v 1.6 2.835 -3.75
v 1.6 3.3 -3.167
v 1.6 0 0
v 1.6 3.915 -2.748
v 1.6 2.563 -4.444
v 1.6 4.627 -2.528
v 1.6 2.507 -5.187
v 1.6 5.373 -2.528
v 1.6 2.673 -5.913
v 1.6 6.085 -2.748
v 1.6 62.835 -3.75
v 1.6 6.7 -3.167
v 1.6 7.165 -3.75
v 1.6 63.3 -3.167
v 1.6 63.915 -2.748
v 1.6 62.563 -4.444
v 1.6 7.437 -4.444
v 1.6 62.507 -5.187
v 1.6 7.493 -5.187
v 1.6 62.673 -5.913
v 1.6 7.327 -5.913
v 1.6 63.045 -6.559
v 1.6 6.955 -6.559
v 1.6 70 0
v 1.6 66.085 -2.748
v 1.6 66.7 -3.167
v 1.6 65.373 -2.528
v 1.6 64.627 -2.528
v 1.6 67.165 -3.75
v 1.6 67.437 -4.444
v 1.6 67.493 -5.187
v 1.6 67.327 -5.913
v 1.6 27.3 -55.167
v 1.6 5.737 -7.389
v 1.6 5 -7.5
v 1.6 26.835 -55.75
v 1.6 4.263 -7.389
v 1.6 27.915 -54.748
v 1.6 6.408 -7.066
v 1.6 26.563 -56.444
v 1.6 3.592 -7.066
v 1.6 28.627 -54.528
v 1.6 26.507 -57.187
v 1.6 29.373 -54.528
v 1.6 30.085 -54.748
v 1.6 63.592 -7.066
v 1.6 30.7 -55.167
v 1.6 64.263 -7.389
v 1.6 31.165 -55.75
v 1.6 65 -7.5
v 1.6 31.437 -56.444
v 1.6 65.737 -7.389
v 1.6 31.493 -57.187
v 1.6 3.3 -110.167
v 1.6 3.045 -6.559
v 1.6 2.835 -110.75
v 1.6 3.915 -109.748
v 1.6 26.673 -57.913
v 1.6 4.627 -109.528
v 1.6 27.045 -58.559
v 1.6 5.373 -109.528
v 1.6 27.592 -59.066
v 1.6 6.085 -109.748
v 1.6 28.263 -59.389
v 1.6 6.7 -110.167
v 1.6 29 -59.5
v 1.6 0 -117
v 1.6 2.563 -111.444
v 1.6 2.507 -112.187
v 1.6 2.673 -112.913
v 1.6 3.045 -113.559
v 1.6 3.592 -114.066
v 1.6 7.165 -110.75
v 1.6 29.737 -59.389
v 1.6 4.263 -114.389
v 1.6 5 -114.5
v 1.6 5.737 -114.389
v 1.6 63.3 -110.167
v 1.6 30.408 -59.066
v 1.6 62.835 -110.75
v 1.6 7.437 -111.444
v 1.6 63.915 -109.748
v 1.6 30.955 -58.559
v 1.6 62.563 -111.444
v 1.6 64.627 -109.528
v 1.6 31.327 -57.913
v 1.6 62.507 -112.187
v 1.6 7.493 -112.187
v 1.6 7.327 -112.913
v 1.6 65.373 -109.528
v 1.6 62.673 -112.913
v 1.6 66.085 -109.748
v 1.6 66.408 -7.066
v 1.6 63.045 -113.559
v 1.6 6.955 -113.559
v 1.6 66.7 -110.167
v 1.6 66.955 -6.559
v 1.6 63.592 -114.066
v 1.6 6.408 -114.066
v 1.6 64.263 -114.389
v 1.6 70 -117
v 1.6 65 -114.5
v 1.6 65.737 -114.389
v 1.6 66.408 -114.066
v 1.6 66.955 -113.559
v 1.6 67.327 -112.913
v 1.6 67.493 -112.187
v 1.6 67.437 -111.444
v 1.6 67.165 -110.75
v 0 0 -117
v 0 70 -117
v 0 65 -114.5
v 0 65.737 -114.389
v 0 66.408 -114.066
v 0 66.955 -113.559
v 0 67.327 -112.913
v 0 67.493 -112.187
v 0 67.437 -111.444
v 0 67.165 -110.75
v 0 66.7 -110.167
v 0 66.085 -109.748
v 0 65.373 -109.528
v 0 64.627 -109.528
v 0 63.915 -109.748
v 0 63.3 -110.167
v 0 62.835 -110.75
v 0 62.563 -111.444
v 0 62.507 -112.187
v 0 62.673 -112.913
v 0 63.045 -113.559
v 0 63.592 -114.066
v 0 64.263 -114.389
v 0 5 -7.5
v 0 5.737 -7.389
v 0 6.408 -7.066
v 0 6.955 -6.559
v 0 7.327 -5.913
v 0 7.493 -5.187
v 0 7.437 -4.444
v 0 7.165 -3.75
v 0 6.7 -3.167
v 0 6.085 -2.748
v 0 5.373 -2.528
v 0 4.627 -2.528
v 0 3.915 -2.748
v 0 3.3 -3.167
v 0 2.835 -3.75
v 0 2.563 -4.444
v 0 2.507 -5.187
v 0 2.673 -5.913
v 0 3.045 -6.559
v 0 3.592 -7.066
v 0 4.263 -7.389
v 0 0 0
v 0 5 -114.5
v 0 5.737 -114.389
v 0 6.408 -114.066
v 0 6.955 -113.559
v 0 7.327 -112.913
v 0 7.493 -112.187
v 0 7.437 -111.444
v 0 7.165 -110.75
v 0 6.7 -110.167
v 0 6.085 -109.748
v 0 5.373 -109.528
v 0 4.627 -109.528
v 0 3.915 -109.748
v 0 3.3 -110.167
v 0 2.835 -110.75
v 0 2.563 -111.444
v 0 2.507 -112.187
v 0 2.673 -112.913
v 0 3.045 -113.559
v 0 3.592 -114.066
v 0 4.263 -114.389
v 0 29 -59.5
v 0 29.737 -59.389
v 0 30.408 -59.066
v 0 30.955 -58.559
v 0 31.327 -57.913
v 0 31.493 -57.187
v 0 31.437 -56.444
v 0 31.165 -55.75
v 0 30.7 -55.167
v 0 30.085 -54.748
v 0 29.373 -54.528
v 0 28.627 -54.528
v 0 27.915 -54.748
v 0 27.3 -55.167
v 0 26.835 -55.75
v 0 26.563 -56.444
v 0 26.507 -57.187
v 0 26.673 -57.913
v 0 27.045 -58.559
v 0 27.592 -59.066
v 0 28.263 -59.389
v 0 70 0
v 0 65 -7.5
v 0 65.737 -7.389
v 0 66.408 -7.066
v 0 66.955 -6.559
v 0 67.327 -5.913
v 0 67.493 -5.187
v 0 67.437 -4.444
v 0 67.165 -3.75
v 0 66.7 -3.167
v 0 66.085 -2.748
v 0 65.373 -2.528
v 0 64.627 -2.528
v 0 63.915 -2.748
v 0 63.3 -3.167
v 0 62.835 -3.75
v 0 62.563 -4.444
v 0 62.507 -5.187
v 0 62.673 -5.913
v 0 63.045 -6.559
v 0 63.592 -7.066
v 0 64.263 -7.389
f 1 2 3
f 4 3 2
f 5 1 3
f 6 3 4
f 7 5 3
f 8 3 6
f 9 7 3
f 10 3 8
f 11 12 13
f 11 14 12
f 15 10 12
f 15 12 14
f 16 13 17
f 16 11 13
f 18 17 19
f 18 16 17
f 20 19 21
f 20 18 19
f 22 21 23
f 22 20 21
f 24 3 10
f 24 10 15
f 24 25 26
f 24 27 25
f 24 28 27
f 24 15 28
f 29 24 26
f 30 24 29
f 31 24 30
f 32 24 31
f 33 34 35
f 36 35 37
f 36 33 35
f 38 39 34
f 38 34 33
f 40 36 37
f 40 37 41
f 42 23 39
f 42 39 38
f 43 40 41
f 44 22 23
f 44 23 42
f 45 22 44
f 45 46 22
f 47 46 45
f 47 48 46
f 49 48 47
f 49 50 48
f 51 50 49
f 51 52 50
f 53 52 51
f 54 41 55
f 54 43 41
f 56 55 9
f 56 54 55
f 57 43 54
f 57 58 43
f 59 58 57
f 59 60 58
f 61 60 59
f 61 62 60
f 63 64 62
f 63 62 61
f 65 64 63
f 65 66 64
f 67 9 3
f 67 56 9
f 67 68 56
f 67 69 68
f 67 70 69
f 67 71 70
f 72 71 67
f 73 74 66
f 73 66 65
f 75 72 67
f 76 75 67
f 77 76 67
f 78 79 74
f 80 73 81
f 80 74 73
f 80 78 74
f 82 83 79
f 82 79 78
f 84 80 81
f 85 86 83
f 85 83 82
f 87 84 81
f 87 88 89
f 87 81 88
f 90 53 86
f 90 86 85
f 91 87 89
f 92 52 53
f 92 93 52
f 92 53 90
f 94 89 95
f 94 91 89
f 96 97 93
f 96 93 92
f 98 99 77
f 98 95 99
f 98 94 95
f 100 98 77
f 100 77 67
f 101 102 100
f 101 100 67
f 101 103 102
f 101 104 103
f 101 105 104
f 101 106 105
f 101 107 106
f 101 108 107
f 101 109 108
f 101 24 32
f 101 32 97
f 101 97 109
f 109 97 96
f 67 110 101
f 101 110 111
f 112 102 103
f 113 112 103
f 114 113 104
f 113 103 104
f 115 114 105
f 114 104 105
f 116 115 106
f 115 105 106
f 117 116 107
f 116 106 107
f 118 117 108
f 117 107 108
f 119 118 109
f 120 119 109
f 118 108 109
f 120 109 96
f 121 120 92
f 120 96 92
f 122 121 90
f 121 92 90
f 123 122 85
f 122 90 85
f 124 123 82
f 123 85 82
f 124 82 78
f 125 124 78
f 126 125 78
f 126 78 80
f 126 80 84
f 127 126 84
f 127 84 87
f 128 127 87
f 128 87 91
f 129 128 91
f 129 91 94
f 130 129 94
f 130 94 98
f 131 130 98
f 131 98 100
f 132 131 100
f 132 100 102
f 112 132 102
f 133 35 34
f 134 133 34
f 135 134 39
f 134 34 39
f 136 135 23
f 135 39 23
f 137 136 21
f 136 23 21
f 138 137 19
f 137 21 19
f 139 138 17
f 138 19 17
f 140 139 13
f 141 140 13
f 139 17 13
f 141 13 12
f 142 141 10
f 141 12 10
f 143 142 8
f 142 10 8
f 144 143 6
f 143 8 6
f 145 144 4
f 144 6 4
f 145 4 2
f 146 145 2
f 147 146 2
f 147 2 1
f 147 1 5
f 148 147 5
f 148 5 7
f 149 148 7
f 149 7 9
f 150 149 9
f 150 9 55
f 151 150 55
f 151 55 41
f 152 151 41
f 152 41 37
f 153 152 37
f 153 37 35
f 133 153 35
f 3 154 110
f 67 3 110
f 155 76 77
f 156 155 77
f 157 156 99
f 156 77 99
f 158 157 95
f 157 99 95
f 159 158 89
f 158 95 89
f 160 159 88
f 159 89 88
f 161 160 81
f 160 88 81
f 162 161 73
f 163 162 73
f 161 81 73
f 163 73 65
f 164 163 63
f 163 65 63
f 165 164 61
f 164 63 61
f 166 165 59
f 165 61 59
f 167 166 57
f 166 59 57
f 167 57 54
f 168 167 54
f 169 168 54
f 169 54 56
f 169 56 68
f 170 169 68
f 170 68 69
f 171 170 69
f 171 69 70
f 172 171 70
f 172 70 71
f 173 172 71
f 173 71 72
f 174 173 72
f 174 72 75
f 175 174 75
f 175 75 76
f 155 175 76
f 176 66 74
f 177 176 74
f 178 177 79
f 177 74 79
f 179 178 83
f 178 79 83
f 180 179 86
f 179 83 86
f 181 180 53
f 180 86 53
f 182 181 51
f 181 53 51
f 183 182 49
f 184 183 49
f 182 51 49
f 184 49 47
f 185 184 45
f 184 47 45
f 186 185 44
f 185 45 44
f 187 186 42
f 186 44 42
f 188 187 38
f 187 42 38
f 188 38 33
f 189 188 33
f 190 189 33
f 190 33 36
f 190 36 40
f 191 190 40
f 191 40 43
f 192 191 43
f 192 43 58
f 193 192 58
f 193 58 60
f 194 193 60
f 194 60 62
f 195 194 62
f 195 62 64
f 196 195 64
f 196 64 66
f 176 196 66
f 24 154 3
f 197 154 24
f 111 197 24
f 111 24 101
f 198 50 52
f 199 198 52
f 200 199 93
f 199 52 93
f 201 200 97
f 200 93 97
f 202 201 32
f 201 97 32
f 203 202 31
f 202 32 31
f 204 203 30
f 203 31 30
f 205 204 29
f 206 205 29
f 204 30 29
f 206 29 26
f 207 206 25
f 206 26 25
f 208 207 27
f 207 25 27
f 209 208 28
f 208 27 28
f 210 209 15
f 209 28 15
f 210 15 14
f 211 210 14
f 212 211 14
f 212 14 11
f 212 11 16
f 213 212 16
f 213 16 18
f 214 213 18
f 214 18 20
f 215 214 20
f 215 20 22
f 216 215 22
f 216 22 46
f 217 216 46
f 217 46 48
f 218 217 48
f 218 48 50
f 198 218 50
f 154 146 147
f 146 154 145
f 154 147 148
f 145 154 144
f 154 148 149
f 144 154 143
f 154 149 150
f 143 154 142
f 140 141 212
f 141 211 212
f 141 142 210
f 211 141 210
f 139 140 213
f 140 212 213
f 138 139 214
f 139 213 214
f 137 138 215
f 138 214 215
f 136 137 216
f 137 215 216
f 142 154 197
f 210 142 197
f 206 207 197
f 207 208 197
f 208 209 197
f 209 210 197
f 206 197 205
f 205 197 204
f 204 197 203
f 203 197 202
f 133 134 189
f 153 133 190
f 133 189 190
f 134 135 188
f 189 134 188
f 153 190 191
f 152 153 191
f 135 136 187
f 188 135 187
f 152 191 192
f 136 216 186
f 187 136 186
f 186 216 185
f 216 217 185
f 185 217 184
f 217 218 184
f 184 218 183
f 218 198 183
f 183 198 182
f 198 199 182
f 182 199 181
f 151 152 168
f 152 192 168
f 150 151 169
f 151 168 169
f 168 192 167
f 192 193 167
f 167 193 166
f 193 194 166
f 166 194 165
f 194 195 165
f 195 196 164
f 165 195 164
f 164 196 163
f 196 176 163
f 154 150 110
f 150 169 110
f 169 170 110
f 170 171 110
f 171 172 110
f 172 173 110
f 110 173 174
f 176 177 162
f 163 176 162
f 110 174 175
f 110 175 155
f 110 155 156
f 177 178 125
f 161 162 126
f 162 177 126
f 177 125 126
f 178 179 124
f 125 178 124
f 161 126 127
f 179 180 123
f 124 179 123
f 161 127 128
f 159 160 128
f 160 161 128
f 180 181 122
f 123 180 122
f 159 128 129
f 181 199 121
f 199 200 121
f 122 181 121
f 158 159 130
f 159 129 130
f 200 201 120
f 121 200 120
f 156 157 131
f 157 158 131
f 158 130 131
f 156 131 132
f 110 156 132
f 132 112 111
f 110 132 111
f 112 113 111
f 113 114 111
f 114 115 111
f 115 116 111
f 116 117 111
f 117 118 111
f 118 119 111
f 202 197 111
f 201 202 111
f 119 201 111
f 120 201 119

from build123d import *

# Parameters (mm, degrees)
SKETCH1_W           = 117
SKETCH1_H           = 70
BOSS_EXTRUDE1_DEPTH = 1.6
SKETCH2_R           = 2.5
CUT_EXTRUDE1_DEPTH  = 2.6


with BuildPart() as part:
    # Sketch1 → Boss-Extrude1 (new body)
    with BuildSketch(Plane(origin=(0, 0, 0), x_dir=(0, 0, -1), z_dir=(1, 0, 0))):
        with Locations((58.5, 35)):
            Rectangle(SKETCH1_W, SKETCH1_H)
    extrude(amount=BOSS_EXTRUDE1_DEPTH)

    # Sketch2 → Cut-Extrude1 (cut, through all)
    with BuildSketch(Plane(origin=(1.6, 0, 0), x_dir=(0, 0, -1), z_dir=(1, 0, 0))):
        with Locations((5, 65)):
            Circle(SKETCH2_R)
        with Locations((5, 5)):
            Circle(SKETCH2_R)
        with Locations((112, 5)):
            Circle(SKETCH2_R)
        with Locations((112, 65)):
            Circle(SKETCH2_R)
        with Locations((57, 29)):
            Circle(SKETCH2_R)
    extrude(amount=-CUT_EXTRUDE1_DEPTH, mode=Mode.SUBTRACT)


solid = part.part
